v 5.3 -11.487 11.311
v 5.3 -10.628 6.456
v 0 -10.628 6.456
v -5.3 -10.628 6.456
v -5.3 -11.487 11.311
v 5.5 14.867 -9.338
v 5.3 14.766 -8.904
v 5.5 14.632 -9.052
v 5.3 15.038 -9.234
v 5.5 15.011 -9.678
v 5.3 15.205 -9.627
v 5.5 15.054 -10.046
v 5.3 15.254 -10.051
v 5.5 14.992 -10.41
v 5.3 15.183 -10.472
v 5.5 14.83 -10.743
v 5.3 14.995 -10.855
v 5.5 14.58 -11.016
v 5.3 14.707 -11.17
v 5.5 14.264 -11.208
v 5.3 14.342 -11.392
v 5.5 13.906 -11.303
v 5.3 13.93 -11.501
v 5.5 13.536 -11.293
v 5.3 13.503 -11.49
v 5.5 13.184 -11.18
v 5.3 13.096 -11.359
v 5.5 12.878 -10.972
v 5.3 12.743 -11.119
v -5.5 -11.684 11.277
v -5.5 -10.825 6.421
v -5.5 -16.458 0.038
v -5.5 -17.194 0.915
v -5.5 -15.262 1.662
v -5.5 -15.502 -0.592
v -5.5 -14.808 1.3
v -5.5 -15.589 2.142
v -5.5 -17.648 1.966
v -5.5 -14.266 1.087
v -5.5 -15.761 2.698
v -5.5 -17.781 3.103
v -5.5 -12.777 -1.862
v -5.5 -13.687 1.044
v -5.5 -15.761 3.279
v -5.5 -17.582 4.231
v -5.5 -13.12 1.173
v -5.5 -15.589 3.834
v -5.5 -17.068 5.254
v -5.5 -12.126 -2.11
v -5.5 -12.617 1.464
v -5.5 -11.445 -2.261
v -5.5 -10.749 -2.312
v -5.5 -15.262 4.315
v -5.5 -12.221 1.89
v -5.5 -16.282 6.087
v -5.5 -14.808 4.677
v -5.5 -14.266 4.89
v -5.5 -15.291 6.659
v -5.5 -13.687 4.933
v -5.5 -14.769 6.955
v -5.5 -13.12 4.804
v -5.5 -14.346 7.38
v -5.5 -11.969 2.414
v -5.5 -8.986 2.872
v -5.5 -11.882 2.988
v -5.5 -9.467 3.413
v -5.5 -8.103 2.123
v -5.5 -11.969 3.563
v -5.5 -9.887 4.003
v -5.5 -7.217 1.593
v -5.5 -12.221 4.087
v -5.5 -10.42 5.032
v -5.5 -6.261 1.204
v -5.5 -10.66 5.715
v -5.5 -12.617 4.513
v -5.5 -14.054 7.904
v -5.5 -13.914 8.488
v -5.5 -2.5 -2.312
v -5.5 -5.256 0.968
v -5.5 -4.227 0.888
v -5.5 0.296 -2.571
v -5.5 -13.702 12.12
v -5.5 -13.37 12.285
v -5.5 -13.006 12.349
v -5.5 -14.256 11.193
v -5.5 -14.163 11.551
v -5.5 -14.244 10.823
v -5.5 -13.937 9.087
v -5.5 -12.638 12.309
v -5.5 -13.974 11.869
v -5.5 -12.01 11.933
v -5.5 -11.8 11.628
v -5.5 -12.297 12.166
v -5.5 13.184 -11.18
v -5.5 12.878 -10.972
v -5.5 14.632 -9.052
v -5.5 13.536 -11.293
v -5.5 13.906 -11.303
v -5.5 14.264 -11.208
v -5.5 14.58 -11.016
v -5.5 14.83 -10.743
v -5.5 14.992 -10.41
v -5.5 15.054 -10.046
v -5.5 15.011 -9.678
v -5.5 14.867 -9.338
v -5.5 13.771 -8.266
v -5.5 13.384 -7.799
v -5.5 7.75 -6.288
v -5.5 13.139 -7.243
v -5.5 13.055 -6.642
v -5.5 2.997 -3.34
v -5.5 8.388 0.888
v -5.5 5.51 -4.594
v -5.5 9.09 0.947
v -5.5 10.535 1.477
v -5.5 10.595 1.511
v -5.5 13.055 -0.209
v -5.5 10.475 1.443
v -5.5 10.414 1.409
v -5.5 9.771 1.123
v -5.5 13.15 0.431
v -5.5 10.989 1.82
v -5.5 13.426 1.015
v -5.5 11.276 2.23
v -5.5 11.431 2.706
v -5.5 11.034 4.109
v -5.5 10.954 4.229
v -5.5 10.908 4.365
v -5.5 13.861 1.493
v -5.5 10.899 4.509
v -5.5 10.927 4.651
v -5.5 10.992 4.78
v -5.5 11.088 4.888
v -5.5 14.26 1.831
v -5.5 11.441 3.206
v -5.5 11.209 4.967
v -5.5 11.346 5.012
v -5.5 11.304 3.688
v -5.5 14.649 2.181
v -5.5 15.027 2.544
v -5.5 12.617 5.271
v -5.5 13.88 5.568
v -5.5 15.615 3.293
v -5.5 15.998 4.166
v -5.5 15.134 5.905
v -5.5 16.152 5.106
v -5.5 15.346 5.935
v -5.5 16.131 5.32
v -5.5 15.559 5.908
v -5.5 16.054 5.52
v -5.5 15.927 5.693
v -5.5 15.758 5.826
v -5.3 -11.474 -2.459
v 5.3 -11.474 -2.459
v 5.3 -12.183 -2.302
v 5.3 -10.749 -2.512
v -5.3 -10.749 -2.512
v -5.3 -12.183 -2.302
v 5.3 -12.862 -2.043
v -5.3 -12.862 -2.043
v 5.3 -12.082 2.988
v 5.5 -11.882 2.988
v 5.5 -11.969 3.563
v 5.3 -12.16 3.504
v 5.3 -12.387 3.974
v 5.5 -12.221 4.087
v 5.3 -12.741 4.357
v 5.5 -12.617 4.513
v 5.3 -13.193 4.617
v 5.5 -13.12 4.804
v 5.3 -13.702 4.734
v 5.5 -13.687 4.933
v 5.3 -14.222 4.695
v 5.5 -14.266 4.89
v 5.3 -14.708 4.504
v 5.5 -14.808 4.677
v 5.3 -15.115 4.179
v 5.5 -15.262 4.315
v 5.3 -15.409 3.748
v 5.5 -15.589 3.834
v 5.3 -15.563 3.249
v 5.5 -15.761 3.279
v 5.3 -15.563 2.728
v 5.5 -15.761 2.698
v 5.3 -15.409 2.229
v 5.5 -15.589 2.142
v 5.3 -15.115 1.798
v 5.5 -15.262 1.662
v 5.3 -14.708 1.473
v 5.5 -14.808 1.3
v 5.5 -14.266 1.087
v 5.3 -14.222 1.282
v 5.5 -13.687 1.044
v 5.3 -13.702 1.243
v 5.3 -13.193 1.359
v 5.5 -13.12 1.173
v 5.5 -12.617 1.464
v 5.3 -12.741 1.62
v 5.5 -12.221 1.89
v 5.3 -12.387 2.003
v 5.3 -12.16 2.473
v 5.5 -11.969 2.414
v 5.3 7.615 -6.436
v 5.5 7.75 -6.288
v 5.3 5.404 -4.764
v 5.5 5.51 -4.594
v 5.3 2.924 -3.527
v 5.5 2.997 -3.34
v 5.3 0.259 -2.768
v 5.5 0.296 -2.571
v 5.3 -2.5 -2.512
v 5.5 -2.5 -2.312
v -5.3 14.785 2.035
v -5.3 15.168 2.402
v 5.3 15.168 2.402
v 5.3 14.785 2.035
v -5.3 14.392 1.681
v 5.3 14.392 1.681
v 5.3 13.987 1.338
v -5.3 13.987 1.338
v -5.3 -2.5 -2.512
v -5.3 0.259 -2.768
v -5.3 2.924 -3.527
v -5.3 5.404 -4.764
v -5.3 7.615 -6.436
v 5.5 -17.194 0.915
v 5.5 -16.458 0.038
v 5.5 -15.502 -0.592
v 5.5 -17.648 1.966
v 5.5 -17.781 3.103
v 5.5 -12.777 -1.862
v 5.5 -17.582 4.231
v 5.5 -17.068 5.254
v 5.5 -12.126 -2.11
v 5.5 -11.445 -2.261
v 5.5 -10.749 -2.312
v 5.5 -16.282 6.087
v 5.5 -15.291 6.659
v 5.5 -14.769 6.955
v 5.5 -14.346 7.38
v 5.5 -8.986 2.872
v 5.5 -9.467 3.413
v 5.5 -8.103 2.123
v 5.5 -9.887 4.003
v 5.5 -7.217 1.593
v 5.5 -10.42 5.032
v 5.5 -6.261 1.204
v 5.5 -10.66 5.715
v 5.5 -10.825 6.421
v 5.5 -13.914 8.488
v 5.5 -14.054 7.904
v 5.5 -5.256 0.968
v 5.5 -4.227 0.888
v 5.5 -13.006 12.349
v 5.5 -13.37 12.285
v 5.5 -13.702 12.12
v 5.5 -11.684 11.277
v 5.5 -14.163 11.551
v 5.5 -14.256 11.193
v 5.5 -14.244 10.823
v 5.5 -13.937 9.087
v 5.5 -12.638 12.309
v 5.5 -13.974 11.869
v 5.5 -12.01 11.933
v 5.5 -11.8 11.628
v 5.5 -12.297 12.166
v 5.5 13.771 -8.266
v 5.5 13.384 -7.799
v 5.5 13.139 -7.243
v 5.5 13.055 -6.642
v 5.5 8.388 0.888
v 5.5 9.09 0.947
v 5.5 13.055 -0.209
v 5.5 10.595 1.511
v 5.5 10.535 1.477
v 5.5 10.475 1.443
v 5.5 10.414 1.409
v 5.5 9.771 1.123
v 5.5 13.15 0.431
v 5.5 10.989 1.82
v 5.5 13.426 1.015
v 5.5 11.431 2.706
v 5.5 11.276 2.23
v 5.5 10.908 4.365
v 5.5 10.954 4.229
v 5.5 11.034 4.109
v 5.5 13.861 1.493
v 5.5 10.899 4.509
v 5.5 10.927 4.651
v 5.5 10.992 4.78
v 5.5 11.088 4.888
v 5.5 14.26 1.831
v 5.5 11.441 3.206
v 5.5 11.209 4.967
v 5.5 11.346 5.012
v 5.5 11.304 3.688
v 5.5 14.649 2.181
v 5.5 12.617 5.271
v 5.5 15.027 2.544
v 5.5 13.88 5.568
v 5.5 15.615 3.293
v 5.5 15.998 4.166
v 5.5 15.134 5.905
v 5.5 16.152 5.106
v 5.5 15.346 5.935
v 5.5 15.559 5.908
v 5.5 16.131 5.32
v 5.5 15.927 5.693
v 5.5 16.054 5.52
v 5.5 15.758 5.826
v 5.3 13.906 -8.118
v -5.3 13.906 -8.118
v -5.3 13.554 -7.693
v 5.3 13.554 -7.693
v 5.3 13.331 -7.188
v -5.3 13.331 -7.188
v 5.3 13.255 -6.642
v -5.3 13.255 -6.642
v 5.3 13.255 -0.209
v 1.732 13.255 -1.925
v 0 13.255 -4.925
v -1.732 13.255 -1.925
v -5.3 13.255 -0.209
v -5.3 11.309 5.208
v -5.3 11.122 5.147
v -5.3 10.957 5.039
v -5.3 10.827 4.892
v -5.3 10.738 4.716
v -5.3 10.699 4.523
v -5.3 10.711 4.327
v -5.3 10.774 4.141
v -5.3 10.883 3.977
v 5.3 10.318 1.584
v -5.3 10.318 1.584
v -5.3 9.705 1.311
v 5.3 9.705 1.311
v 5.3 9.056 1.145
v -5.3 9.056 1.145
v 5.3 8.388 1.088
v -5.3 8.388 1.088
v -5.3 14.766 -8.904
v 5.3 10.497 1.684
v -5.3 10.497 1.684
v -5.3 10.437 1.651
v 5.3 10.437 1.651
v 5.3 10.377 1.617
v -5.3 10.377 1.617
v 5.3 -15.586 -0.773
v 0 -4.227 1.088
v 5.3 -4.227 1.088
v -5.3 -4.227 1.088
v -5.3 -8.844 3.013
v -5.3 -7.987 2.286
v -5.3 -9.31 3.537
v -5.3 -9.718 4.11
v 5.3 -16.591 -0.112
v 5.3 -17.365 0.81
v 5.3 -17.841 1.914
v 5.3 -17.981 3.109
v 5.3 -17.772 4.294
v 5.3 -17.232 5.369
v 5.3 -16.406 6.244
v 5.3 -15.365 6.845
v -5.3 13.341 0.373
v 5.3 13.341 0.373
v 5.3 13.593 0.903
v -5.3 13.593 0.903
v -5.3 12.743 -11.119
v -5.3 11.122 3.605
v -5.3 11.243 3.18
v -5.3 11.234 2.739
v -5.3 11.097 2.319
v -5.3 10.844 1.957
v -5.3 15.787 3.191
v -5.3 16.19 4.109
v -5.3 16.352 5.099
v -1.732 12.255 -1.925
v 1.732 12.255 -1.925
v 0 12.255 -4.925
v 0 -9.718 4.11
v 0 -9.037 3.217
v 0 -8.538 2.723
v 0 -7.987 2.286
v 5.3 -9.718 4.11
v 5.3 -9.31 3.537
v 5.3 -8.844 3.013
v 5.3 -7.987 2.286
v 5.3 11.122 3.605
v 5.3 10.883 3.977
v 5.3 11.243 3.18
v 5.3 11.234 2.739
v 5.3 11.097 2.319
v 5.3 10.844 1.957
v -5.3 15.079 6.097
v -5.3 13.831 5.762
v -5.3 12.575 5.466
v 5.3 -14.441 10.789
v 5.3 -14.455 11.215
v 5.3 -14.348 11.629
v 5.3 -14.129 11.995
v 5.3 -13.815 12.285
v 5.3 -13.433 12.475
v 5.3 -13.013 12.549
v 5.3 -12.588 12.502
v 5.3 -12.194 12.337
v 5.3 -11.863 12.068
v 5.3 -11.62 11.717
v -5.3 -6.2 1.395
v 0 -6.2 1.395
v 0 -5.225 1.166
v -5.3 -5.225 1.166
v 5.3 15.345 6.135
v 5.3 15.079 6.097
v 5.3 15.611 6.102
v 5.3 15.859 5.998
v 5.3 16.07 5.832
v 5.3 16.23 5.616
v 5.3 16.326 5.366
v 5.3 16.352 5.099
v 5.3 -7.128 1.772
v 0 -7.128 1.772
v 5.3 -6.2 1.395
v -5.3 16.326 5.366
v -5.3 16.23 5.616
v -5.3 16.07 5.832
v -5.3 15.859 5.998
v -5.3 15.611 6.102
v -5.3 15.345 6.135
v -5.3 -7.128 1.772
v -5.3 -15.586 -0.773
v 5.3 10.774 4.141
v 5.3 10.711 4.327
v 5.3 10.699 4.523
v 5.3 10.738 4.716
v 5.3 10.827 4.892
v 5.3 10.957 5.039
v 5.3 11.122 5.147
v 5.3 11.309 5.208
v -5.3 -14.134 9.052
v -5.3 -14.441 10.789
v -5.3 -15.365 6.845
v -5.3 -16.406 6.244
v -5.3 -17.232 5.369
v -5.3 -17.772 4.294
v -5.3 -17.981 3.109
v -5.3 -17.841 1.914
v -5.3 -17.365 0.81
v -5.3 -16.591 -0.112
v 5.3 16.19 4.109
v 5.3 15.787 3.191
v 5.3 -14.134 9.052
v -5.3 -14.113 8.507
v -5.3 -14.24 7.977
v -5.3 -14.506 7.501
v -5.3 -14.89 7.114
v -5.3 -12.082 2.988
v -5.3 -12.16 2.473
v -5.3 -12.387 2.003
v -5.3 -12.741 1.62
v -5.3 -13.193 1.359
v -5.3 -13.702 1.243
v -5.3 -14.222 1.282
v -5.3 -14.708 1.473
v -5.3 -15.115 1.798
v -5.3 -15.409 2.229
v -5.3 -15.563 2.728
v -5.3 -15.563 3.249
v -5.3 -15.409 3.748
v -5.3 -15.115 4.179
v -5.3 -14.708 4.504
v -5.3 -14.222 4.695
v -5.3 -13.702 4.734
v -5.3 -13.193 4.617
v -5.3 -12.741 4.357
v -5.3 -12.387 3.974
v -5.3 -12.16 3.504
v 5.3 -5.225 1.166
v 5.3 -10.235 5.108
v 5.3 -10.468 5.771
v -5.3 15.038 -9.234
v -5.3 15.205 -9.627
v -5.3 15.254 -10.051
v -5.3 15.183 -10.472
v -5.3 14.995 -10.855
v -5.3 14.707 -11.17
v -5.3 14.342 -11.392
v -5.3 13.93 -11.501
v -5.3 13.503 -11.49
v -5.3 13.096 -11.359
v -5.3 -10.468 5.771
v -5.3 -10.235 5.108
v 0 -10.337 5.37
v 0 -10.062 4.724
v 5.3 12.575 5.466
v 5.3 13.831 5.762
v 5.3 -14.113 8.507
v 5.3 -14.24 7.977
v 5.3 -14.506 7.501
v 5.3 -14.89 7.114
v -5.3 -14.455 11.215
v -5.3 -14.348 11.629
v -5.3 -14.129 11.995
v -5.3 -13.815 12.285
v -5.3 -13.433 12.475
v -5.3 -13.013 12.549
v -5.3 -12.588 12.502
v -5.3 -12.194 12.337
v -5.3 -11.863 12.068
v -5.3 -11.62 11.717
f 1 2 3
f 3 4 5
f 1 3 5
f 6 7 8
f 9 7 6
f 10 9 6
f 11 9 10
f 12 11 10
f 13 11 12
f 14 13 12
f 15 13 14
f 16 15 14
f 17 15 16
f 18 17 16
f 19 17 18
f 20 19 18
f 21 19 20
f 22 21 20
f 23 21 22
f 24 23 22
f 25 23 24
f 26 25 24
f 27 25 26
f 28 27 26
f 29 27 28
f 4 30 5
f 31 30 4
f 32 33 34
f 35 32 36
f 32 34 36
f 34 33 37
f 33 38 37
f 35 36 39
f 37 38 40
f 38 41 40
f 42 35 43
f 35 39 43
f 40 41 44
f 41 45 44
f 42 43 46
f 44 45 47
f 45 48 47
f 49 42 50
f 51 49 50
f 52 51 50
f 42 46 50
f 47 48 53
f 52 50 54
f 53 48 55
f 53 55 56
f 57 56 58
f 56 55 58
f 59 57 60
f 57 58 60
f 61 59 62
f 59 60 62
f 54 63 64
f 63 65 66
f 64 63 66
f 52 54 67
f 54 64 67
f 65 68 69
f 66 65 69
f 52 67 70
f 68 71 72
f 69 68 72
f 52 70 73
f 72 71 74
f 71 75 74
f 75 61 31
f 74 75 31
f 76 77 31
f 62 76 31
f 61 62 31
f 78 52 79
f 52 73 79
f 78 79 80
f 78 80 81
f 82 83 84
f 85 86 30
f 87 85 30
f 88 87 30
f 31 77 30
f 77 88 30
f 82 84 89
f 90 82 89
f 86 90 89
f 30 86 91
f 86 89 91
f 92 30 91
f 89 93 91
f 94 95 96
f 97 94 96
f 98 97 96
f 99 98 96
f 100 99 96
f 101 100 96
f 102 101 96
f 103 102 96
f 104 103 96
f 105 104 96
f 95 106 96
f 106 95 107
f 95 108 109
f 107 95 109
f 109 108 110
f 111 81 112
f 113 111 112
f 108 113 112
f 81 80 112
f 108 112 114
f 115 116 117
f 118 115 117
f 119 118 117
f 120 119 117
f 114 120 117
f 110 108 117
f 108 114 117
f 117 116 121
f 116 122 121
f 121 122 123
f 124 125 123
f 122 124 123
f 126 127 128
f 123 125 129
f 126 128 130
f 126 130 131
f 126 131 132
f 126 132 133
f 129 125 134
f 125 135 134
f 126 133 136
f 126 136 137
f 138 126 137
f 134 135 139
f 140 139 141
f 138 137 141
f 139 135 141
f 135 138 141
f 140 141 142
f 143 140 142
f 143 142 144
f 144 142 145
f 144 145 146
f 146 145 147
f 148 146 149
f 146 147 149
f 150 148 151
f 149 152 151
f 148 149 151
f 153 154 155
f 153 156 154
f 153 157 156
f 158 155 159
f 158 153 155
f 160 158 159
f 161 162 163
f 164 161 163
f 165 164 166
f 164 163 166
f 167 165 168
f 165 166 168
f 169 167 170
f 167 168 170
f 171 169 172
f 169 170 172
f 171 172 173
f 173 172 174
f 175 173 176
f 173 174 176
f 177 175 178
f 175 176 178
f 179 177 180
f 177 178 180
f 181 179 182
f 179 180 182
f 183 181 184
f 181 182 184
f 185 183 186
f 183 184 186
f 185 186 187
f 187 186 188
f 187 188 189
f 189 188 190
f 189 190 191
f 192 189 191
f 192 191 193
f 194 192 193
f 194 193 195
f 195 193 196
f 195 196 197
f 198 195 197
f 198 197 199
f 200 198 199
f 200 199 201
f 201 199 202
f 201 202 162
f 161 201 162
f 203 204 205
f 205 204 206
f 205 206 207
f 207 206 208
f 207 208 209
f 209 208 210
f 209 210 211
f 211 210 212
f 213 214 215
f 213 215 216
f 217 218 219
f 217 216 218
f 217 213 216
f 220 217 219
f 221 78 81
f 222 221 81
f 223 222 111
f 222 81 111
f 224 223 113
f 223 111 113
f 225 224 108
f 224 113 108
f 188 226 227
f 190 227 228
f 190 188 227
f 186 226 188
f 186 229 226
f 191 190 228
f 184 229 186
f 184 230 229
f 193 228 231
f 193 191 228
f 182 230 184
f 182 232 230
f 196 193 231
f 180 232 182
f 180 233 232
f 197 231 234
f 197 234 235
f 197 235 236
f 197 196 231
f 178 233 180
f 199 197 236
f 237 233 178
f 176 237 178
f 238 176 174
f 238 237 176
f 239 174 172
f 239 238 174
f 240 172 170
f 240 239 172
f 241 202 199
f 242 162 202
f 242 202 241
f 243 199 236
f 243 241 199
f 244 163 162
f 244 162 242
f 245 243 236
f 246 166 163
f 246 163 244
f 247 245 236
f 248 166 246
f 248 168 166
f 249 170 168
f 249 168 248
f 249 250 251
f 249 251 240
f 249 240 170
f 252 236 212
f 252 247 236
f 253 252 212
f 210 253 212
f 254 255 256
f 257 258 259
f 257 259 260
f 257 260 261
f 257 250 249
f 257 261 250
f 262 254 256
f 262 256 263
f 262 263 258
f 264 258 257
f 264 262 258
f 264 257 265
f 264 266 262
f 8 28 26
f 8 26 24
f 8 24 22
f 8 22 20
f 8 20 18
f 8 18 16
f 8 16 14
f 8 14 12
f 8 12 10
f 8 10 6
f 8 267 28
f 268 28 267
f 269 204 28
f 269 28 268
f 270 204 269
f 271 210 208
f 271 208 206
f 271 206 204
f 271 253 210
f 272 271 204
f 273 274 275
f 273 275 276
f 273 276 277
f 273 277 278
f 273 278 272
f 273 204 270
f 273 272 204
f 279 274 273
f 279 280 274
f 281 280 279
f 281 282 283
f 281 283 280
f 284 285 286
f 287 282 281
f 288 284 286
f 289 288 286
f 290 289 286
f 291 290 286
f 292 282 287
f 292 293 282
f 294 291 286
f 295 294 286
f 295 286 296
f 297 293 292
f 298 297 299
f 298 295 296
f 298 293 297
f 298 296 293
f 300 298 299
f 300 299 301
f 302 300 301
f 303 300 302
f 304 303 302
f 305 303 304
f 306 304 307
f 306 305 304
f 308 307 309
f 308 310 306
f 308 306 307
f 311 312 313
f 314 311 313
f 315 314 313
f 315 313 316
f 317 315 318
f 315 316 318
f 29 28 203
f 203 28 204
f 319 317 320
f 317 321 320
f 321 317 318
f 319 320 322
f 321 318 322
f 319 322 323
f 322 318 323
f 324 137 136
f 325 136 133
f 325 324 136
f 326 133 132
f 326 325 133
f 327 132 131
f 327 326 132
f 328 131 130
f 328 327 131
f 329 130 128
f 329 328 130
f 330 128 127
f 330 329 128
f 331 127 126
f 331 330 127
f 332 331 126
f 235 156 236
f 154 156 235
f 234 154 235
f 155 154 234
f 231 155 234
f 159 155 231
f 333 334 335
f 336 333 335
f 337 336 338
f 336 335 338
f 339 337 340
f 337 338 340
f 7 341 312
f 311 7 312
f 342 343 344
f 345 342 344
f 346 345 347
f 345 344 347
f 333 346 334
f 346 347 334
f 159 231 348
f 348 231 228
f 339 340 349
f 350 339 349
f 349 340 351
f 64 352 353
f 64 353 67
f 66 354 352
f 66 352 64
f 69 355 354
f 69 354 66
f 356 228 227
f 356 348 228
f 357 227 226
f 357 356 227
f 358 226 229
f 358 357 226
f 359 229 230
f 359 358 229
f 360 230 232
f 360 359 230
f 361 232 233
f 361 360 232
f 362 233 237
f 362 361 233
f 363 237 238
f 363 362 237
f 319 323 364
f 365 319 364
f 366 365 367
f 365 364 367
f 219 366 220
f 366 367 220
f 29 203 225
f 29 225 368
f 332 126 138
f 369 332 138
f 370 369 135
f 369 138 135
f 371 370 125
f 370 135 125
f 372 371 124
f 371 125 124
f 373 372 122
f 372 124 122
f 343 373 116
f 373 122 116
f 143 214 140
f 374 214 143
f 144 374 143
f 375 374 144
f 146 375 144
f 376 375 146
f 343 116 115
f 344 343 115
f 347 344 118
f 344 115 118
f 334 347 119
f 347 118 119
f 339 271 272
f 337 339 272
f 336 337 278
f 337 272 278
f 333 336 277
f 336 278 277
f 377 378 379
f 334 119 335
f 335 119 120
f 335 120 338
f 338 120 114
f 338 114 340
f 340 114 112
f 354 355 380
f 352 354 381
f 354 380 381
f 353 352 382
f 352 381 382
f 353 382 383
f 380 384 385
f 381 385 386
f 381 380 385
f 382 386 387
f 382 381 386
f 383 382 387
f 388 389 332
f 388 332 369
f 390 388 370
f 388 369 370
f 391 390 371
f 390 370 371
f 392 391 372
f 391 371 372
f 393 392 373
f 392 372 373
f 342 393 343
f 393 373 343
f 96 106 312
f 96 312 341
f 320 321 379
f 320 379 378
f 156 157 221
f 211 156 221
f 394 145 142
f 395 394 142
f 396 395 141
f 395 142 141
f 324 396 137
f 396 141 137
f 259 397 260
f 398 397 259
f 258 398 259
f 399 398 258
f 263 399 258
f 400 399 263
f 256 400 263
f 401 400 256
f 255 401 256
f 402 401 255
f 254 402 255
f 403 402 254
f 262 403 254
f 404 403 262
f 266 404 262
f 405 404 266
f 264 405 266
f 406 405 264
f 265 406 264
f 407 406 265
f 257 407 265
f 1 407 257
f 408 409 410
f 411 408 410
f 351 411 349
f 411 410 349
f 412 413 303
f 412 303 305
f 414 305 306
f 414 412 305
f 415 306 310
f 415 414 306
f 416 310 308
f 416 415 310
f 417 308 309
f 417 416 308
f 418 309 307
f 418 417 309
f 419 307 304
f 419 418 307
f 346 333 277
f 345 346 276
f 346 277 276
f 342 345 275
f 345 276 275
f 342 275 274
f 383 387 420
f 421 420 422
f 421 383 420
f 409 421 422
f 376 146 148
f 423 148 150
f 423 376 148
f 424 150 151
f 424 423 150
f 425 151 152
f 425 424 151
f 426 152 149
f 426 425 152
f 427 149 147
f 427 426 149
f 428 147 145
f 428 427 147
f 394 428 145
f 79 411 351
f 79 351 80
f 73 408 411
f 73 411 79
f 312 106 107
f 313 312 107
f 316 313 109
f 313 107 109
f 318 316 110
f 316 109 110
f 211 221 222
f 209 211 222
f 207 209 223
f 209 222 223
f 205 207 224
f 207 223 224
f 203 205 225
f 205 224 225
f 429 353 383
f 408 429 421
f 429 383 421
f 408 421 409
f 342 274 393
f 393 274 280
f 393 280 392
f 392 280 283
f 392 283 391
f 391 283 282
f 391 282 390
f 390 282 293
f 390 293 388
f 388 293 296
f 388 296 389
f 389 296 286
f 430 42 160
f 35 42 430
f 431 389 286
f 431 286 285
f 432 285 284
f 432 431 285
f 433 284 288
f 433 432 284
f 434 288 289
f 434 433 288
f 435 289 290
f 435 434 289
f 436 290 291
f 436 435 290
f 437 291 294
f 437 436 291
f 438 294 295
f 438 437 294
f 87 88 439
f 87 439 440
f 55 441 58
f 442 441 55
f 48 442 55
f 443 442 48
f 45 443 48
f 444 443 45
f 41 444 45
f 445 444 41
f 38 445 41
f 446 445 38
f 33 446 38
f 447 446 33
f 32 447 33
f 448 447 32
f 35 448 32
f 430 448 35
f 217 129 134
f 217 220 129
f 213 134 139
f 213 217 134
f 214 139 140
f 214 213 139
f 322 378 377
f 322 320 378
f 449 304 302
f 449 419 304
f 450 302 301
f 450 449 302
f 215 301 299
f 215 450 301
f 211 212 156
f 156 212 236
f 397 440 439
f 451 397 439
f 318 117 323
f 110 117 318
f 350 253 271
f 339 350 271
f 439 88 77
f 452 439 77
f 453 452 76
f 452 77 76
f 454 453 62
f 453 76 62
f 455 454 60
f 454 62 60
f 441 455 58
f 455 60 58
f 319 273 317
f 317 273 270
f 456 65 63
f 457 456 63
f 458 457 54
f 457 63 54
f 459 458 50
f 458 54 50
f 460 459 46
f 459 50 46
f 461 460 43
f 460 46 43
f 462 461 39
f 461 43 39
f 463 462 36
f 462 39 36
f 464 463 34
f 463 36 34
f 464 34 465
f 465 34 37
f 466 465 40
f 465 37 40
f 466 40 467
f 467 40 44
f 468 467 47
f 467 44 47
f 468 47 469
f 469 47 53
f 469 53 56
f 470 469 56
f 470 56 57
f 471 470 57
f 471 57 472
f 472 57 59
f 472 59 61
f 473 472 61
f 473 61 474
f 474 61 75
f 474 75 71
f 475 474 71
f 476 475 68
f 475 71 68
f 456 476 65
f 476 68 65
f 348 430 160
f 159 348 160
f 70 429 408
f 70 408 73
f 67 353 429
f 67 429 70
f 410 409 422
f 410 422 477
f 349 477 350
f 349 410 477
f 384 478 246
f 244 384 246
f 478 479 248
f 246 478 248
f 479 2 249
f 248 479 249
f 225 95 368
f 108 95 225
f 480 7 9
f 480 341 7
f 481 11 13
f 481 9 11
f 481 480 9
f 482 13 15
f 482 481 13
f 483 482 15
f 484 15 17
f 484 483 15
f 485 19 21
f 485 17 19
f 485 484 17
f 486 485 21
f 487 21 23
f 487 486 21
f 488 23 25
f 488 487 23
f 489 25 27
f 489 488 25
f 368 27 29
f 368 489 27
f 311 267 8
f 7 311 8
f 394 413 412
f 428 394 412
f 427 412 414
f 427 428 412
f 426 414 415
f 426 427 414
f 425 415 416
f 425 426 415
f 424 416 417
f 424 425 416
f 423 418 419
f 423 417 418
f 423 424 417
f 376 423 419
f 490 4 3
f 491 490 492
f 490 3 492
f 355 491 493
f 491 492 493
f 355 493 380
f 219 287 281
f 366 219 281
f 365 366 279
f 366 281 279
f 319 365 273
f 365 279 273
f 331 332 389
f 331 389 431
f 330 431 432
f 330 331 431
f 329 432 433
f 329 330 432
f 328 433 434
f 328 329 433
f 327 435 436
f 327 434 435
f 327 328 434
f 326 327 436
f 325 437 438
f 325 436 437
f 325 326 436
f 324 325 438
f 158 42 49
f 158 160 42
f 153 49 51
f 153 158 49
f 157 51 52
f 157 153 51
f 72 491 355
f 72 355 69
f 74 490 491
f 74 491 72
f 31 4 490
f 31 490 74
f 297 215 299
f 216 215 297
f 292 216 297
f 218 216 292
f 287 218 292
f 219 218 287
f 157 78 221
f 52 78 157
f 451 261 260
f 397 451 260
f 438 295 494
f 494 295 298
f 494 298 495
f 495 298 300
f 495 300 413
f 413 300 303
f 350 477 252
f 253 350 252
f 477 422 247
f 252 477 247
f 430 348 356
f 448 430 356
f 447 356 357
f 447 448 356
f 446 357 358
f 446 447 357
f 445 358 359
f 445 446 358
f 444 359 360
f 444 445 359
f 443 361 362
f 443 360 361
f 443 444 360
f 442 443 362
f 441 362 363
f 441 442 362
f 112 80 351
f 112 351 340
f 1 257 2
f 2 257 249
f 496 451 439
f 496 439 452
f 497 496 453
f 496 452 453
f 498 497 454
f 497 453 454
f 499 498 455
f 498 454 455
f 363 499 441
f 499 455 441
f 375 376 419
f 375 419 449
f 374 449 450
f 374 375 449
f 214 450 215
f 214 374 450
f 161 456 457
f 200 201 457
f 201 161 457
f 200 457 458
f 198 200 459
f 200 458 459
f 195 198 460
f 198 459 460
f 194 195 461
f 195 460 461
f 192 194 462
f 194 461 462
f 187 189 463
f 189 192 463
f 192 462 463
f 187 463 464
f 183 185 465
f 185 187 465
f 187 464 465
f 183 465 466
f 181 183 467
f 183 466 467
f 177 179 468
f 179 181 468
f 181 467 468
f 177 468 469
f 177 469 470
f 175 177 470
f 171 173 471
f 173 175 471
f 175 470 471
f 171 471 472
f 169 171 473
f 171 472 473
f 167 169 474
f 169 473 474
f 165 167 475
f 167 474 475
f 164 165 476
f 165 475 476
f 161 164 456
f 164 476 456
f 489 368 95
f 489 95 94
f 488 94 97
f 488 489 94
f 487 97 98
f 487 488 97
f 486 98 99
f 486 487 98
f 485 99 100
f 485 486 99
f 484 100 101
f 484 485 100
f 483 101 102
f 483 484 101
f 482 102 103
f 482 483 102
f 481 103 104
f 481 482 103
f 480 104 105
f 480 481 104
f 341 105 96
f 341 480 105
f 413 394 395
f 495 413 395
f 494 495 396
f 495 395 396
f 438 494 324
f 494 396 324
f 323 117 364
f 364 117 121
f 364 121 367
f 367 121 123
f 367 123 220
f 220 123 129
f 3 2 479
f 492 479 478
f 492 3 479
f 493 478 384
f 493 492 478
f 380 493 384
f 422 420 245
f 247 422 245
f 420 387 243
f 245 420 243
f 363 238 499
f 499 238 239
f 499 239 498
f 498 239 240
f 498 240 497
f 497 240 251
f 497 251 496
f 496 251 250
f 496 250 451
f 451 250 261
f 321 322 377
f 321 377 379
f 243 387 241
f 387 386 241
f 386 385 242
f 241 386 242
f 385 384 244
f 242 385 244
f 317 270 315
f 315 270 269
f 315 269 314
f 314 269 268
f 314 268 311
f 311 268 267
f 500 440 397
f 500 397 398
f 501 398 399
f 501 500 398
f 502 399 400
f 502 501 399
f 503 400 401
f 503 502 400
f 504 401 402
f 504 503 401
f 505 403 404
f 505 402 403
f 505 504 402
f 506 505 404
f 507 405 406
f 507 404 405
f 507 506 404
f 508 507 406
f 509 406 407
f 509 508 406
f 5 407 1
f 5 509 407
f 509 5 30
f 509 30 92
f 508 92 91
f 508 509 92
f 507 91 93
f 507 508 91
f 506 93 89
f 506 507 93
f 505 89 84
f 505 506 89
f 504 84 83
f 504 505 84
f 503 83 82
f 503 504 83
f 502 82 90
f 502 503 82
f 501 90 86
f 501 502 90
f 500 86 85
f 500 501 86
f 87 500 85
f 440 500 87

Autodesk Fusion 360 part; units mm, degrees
sketch "Sketch1" plane through (0, 0, 0) normal (1, 0, 0) x (0, 1, 0) in component "[a]_latch"
  spline S0 degree 3 poles (-10.6277, 6.4557) (-10.4802, 5.6222) (-10.1713, 4.8255) (-9.2656, 3.3954) (-8.6774, 2.7757) (-7.4408, 1.8988) (-6.8381, 1.5983) (-5.5622, 1.1918) (-4.8966, 1.0884) (-4.2271, 1.0884) knots 0 0 0 0 0.253919 0.253919 0.507838 0.507838 0.708696 0.708696 0.909554 0.909554 0.909554 0.909554
  line L0 (-10.6277, 6.4557) -> (-10.4802, 5.6222)
  line L1 (-10.4802, 5.6222) -> (-10.1713, 4.8255)
  line L2 (-10.1713, 4.8255) -> (-9.2656, 3.3954)
  line L3 (-9.2656, 3.3954) -> (-8.6774, 2.7757)
  line L4 (-8.6774, 2.7757) -> (-7.4408, 1.8988)
  line L5 (-7.4408, 1.8988) -> (-6.8381, 1.5983)
  line L6 (-6.8381, 1.5983) -> (-5.5622, 1.1918)
  line L7 (-5.5622, 1.1918) -> (-4.8966, 1.0884)
  line L8 (-4.8966, 1.0884) -> (-4.2271, 1.0884)
  line L9 (-10.6277, 6.4557) -> (-11.487, 11.3114)
  arc A0 (-11.487, 11.3114) -> (-14.4411, 10.7886) centre (-12.964, 11.05) ccw
  line L10 (-14.4411, 10.7886) -> (-14.1338, 9.0523)
  arc A1 (-15.3647, 6.8451) -> (-14.1338, 9.0523) centre (-16.1032, 8.7038) ccw
  arc A2 (-15.3647, 6.8451) -> (-15.5863, -0.7728) centre (-13.8325, 2.9884) ccw
  line L11 (-15.5863, -0.7728) -> (-12.862, -2.0432)
  arc A3 (-12.862, -2.0432) -> (-10.749, -2.5116) centre (-10.749, 2.4884) ccw
  line L12 (-10.749, -2.5116) -> (-2.5005, -2.5116)
  arc A4 (7.6148, -6.4355) -> (-2.5005, -2.5116) centre (-2.5005, -17.5116) ccw
  line L13 (7.6148, -6.4355) -> (12.7434, -11.1193)
  arc A5 (12.7434, -11.1193) -> (14.7665, -8.904) centre (13.7549, -10.0116) ccw
  line L14 (14.7665, -8.904) -> (13.9062, -8.1184)
  arc A6 (13.2549, -6.6416) -> (13.9062, -8.1184) centre (15.2549, -6.6416) ccw
  line L15 (13.2549, -6.6416) -> (13.2549, -0.2086)
  arc A7 (13.9874, 1.3385) -> (13.2549, -0.2086) centre (15.2549, -0.2086) ccw
  arc A8 (13.9874, 1.3385) -> (15.1677, 2.4015) centre (3.2133, 14.4884) ccw
  arc A9 (15.1677, 2.4015) -> (16.3522, 5.0986) centre (12.3549, 5.2455) ccw
  arc A10 (16.3522, 5.0986) -> (15.0788, 6.0971) centre (15.3529, 5.1354) ccw
  arc A11 (11.309, 5.2082) -> (15.0788, 6.0971) centre (3.5545, 46.5367) ccw
  arc A12 (11.309, 5.2082) -> (10.8832, 3.9768) centre (11.4473, 4.4711) ccw
  arc A13 (10.4966, 1.6845) -> (10.8832, 3.9768) centre (9.7549, 2.9884) ccw
  arc A14 (8.3883, 1.0884) -> (10.3175, 1.5843) centre (8.3883, 5.0884) ccw
  arc A15 (10.3175, 1.5843) -> (10.4966, 1.6845) centre (3.2133, 14.4884) ccw
  line L16 (8.3883, 1.0884) -> (-4.2271, 1.0884)
  circle A16 centre (-13.8325, 2.9884) radius 1.75
extrude "Extrude1" add sketch "Sketch1" along normal mid plane 11 in component "[a]_latch"
chamfer "Chamfer1" distance 0.2 angle 45 52 edges at (5.5, -11.0573, 8.8835) (5.5, -13.2254, 12.527) (5.5, -14.2874, 9.9204) (5.5, -14.3565, 7.7296) (5.5, -17.9807, 3.109) (5.5, -14.2242, -1.408) (5.5, -11.8312, -2.3931) (5.5, -6.6247, -2.5116) (5.5, 2.9244, -3.527) (5.5, 10.1791, -8.7774) (5.5, 14.8625, -11.0232) (5.5, 14.3363, -8.5112) (5.5, 13.425, -7.4486) (5.5, 13.2549, -3.4251) (5.5, 13.4473, 0.6473) (5.5, 14.59, 1.8562) (5.5, 16.0173, 3.6371) (5.5, 15.9699, 5.9223) (5.5, 13.2041, 5.6092) (5.5, 10.7385, 4.7162) (5.5, 11.234, 2.7389) (5.5, 10.4072, 1.6341) (5.5, 9.3843, 1.2143) (5.5, 2.0806, 1.0884) (5.5, -8.4061, 2.6098) (5.5, -15.464, 3.6212) (-5.5, -11.0573, 8.8835) (-5.5, -8.4061, 2.6098) (-5.5, 2.0806, 1.0884) (-5.5, 9.3843, 1.2143) (-5.5, 10.4072, 1.6341) (-5.5, 11.234, 2.7389) (-5.5, 10.7385, 4.7162) (-5.5, 13.2041, 5.6092) (-5.5, 15.9699, 5.9223) (-5.5, 16.0173, 3.6371) (-5.5, 14.59, 1.8562) (-5.5, 13.4473, 0.6473) (-5.5, 13.2549, -3.4251) (-5.5, 13.425, -7.4486) (-5.5, 14.3363, -8.5112) (-5.5, 14.8625, -11.0232) (-5.5, 10.1791, -8.7774) (-5.5, 2.9244, -3.527) (-5.5, -6.6247, -2.5116) (-5.5, -11.8312, -2.3931) (-5.5, -14.2242, -1.408) (-5.5, -17.9807, 3.109) (-5.5, -14.3565, 7.7296) (-5.5, -14.2874, 9.9204) (-5.5, -13.2254, 12.527) (-5.5, -15.464, 2.3555) in component "[a]_latch"
sketch "Sketch2" plane through (0, 13.2549, 0) normal (0, 1, 0) x (-1, 0, 0) in component "[a]_latch"
  line L0 (5.3, -6.6416) -> (5.3, -0.2086)
  line L1 (5.3, -0.2086) -> (-5.3, -0.2086)
  line L2 (-5.3, -0.2086) -> (-5.3, -6.6416)
  line L3 (-5.3, -6.6416) -> (5.3, -6.6416)
  line L4 (-1.7321, -1.9251) -> (1.7321, -1.9251)
  line L5 (1.7321, -1.9251) -> (0, -4.9251)
  line L6 (0, -4.9251) -> (-1.7321, -1.9251)
extrude "Extrude2" cut sketch "Sketch2" against normal blind 1 contours L4 L5 L6 in component "[a]_latch"
component "[a]_latch" placed x (1, 0, 0) y (0, 1, 0) z (0, 0, 1) at (0, 0, 0)
